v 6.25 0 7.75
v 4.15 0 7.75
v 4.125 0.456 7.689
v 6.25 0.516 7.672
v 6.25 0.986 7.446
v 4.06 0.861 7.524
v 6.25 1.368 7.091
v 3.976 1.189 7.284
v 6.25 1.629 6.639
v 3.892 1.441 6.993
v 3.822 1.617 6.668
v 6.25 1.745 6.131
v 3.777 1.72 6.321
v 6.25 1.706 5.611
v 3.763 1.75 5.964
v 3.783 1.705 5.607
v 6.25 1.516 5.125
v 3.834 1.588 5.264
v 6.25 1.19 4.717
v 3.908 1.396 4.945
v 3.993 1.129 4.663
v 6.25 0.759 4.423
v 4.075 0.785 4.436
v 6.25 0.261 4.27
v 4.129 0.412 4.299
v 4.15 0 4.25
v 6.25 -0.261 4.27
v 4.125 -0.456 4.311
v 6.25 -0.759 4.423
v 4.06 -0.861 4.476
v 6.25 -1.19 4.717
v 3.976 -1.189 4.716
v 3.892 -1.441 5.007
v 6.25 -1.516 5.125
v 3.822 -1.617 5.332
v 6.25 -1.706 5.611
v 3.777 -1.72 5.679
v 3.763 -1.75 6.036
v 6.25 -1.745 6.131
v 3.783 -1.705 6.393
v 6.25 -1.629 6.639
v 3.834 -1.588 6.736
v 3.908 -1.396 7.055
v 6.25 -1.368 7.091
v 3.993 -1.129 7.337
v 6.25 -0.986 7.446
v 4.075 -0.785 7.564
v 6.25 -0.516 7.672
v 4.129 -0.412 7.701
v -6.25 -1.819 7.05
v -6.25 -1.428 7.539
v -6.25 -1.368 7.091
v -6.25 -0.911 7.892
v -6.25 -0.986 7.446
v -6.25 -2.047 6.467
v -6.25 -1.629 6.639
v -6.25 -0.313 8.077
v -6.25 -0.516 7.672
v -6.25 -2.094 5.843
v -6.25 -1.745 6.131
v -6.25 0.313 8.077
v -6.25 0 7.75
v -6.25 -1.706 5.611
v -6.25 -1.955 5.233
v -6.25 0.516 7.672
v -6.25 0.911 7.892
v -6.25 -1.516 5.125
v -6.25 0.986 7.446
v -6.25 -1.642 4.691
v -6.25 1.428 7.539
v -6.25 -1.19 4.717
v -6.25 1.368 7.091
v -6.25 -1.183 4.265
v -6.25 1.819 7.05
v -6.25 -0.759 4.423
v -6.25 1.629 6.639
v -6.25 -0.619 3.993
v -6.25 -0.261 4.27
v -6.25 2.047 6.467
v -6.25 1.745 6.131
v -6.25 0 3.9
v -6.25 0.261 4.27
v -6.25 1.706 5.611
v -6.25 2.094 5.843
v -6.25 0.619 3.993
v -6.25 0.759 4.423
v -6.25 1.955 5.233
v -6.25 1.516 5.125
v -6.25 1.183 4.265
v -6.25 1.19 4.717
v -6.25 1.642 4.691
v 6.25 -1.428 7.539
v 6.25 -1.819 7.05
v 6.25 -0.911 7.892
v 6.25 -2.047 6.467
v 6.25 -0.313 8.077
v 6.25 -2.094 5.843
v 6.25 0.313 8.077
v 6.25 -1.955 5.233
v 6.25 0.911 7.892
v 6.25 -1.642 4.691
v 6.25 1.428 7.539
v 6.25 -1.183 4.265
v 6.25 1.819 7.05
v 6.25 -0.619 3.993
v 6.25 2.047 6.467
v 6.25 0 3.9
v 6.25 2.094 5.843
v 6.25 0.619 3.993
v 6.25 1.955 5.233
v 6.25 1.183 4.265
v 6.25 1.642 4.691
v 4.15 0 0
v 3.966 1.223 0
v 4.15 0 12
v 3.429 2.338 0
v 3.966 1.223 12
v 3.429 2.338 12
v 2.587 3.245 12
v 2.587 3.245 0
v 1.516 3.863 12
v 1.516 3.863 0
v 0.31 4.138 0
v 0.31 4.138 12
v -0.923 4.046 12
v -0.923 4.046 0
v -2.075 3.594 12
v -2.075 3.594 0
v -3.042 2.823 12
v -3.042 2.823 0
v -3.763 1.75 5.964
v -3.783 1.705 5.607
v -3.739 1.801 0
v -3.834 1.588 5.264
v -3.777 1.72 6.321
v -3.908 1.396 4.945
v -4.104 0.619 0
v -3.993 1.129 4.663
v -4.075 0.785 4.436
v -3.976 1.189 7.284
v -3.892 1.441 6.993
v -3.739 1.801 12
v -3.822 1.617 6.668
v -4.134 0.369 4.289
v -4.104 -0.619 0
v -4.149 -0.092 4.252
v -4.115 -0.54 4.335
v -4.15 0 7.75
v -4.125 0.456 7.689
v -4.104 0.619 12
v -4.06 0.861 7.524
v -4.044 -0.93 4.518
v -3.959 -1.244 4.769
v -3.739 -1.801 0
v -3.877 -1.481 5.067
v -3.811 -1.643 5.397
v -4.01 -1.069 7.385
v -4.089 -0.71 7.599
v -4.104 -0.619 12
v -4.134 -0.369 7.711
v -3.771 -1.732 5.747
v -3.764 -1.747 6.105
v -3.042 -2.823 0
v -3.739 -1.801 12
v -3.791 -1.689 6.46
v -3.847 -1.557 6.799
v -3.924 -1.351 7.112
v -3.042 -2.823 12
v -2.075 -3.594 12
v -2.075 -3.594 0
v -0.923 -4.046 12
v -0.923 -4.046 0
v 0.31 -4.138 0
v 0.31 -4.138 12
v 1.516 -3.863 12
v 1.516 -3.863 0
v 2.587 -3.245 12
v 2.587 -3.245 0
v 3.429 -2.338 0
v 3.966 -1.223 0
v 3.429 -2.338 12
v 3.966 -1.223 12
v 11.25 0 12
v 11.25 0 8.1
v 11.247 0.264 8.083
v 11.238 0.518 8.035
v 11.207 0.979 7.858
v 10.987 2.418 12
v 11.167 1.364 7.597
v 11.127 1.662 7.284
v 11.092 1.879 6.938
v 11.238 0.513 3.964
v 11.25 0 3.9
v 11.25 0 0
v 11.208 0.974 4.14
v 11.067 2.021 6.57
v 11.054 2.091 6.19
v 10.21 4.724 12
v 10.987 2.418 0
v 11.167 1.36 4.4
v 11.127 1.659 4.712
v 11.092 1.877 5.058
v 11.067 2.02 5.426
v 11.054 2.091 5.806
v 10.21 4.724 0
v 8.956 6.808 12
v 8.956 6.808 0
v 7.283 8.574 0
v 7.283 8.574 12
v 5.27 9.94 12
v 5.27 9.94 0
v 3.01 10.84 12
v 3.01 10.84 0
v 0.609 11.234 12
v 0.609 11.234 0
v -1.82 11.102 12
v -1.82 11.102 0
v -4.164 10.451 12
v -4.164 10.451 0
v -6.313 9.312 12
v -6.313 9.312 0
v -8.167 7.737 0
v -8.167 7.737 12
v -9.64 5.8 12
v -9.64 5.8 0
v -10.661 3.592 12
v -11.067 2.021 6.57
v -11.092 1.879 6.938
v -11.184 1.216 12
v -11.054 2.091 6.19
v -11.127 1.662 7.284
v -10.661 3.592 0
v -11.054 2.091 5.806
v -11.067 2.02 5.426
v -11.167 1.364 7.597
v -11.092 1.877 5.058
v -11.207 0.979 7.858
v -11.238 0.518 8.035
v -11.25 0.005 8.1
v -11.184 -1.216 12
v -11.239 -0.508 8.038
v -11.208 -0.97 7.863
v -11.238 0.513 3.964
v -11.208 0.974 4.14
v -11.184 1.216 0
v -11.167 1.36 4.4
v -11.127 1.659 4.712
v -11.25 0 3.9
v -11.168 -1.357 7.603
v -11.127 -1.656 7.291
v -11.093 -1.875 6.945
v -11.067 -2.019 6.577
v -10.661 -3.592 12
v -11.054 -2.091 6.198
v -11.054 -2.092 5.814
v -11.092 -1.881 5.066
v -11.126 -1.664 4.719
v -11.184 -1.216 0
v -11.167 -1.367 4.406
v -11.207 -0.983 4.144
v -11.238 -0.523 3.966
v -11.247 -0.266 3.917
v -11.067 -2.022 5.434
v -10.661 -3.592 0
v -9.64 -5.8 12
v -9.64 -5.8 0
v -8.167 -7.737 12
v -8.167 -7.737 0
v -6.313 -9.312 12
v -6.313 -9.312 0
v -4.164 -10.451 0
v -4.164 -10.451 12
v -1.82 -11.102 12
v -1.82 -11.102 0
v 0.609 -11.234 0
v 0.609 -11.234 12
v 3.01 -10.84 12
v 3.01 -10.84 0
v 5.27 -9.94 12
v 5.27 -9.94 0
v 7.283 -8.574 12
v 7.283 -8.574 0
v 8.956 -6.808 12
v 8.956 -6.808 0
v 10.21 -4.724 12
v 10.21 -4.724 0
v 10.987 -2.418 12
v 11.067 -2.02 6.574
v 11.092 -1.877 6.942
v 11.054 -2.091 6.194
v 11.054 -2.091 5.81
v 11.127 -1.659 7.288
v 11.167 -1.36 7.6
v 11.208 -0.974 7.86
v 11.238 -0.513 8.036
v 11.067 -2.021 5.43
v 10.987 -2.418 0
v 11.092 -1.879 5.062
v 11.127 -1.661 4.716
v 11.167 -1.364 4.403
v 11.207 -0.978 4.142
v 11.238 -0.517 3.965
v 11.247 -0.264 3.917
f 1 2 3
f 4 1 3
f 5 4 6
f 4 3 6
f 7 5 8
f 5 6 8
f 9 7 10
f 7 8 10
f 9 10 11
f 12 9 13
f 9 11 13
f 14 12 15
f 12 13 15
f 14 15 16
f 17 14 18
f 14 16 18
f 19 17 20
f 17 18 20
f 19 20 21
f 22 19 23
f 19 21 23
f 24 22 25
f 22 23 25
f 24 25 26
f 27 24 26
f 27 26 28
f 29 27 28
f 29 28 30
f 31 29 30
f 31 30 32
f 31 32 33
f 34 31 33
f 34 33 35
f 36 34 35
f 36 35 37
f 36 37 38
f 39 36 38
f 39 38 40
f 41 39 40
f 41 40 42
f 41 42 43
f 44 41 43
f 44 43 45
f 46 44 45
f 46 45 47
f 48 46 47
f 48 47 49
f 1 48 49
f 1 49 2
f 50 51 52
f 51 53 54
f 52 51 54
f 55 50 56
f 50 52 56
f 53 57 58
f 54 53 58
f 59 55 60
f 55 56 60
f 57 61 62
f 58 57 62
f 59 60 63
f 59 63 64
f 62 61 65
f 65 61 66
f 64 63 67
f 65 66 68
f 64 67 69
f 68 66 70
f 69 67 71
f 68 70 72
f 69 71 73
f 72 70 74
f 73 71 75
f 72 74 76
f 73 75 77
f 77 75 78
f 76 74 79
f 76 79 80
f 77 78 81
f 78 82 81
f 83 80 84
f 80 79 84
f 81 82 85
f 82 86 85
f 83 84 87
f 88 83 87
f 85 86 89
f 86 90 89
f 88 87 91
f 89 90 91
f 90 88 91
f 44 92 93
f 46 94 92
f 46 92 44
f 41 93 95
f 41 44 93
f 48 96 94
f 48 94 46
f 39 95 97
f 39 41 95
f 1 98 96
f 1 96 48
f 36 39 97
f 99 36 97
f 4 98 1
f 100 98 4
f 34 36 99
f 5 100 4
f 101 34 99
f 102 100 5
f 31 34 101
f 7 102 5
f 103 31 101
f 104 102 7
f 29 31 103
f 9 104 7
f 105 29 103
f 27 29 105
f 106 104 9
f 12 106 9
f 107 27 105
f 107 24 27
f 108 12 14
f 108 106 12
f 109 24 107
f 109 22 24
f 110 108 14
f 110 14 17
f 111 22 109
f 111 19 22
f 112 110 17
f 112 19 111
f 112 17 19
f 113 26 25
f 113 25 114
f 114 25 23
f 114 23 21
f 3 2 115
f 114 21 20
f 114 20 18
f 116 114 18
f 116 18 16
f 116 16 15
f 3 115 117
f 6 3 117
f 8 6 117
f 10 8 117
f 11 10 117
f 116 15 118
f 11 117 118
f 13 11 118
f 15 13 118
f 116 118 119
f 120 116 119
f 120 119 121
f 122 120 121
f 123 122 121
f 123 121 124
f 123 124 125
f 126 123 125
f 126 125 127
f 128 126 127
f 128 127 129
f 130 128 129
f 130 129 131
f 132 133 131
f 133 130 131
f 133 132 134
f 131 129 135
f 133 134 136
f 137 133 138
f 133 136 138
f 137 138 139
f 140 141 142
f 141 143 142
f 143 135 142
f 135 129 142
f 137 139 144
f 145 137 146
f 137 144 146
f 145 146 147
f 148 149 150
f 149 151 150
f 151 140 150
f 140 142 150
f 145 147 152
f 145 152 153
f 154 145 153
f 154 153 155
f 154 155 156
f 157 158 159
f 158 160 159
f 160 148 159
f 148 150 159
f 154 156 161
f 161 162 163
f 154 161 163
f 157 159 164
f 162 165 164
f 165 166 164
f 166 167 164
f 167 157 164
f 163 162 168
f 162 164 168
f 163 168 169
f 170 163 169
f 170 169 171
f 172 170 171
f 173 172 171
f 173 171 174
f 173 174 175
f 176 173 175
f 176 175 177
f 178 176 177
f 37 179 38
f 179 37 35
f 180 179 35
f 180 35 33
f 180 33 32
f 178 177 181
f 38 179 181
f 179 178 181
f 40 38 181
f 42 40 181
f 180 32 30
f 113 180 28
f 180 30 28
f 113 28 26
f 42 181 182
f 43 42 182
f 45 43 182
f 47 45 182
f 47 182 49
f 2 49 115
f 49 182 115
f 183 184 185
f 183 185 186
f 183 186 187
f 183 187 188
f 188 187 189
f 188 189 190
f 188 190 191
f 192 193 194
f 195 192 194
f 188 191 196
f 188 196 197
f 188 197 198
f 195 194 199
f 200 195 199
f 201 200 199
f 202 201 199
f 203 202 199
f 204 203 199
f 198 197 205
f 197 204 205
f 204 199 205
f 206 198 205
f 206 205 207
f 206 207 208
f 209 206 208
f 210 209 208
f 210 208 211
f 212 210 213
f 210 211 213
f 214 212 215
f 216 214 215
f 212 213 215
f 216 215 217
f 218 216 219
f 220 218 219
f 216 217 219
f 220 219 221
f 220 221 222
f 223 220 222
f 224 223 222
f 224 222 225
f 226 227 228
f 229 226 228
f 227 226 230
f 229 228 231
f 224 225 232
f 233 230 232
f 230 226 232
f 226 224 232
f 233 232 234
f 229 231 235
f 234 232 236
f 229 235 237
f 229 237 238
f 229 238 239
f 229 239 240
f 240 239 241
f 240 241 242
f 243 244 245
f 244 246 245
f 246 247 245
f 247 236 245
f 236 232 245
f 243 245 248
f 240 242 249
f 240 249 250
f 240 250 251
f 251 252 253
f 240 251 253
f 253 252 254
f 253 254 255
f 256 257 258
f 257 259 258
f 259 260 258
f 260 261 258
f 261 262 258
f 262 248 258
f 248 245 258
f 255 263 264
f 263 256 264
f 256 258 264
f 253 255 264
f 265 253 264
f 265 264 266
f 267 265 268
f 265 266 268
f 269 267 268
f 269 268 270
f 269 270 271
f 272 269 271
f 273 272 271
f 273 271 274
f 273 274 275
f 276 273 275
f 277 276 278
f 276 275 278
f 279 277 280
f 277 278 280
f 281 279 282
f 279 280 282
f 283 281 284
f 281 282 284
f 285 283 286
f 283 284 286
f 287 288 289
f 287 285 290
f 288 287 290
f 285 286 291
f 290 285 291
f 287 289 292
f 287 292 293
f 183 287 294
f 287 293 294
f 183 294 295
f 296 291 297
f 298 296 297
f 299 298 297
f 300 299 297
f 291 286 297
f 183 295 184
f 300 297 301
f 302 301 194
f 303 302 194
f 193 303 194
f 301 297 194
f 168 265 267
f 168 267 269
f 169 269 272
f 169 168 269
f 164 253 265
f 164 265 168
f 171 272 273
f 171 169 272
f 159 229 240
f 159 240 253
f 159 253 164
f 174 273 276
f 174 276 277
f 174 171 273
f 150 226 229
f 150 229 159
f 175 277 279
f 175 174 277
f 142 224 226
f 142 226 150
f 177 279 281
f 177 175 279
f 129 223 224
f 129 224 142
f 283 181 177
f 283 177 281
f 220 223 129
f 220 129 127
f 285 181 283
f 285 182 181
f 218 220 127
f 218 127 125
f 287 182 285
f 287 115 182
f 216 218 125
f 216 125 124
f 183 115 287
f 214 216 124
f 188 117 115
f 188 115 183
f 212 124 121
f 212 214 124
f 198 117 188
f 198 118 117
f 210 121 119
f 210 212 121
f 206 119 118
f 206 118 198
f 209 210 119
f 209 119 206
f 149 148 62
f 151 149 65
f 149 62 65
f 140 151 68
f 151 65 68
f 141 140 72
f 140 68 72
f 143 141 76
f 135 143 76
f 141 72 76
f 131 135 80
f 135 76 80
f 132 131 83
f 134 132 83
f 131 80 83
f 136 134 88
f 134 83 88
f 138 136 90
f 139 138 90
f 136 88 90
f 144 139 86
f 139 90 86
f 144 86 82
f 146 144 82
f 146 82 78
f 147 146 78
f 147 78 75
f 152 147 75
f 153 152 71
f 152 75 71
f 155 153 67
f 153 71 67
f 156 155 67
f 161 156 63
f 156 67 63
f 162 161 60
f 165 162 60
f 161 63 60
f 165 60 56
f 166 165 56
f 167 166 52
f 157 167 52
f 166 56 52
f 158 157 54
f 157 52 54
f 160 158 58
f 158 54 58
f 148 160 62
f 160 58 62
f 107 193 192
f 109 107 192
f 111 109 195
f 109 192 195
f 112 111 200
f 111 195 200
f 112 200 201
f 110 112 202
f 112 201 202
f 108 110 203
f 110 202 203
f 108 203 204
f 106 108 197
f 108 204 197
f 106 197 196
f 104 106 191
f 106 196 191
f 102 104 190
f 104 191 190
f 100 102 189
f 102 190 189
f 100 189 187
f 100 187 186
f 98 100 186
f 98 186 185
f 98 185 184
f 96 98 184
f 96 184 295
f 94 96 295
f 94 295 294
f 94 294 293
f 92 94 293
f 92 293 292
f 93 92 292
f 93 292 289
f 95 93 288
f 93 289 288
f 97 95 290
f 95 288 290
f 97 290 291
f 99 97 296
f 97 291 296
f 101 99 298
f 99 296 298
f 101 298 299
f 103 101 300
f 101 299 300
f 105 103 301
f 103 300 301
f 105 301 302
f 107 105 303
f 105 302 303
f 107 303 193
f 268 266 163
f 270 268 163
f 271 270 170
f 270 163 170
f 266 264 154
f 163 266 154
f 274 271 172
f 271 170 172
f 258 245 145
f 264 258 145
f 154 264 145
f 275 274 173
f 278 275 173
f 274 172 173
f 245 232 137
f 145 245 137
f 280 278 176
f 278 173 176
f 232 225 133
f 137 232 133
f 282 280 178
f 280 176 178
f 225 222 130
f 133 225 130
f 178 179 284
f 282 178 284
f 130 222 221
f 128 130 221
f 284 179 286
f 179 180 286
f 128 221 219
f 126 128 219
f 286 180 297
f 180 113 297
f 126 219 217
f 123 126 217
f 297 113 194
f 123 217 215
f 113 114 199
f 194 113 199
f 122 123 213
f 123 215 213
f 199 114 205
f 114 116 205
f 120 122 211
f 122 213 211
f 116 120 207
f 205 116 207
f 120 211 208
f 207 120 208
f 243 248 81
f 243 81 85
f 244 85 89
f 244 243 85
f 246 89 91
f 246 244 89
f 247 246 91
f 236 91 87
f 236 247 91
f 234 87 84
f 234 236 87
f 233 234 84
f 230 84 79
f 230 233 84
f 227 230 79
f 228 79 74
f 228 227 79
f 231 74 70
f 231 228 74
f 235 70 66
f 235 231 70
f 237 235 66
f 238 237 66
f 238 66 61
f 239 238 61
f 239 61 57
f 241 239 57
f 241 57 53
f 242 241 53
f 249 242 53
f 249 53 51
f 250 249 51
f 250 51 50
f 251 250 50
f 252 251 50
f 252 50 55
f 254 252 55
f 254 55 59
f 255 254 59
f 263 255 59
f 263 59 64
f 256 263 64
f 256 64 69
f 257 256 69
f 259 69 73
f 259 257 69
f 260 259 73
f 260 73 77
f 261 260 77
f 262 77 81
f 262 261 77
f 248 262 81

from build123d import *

# Parameters (mm, degrees)
SKETCH1_R           = 11.25
BOSS_EXTRUDE1_DEPTH = 12
SKETCH2_R           = 4.15
CUT_EXTRUDE1_DEPTH  = 15
SKETCH3_R           = 2.1
CUT_EXTRUDE2_DEPTH  = 5
SKETCH4_R           = 1.75
CUT_EXTRUDE3_DEPTH  = 18.5000001


with BuildPart() as part:
    # Sketch1 → Boss-Extrude1 (new body)
    with BuildSketch(Plane.XY):
        Circle(SKETCH1_R)
    extrude(amount=BOSS_EXTRUDE1_DEPTH)

    # Sketch2 → Cut-Extrude1 (cut)
    with BuildSketch(Plane.XY.offset(12)):
        Circle(SKETCH2_R)
    extrude(amount=-CUT_EXTRUDE1_DEPTH, mode=Mode.SUBTRACT)

    # Sketch3 → Cut-Extrude2 (cut)
    with BuildSketch(Plane(origin=(-11.25, 0, 0), x_dir=(0, 0, -1), z_dir=(1, 0, 0))):
        with Locations((-6, 0)):
            Circle(SKETCH3_R)
    cut_extrude2 = extrude(amount=CUT_EXTRUDE2_DEPTH, mode=Mode.SUBTRACT)

    # Sketch4 → Cut-Extrude3 (cut, through all)
    with BuildSketch(Plane.ZY.offset(6.25)):
        with Locations((6, 0)):
            Circle(SKETCH4_R)
    extrude(amount=-CUT_EXTRUDE3_DEPTH, mode=Mode.SUBTRACT)

    # Mirror1: Cut-Extrude2 across plane
    add(cut_extrude2.mirror(Plane(origin=(0, 0, 0), x_dir=(0, 0, 1), z_dir=(1, 0, 0))), mode=Mode.SUBTRACT)


solid = part.part
